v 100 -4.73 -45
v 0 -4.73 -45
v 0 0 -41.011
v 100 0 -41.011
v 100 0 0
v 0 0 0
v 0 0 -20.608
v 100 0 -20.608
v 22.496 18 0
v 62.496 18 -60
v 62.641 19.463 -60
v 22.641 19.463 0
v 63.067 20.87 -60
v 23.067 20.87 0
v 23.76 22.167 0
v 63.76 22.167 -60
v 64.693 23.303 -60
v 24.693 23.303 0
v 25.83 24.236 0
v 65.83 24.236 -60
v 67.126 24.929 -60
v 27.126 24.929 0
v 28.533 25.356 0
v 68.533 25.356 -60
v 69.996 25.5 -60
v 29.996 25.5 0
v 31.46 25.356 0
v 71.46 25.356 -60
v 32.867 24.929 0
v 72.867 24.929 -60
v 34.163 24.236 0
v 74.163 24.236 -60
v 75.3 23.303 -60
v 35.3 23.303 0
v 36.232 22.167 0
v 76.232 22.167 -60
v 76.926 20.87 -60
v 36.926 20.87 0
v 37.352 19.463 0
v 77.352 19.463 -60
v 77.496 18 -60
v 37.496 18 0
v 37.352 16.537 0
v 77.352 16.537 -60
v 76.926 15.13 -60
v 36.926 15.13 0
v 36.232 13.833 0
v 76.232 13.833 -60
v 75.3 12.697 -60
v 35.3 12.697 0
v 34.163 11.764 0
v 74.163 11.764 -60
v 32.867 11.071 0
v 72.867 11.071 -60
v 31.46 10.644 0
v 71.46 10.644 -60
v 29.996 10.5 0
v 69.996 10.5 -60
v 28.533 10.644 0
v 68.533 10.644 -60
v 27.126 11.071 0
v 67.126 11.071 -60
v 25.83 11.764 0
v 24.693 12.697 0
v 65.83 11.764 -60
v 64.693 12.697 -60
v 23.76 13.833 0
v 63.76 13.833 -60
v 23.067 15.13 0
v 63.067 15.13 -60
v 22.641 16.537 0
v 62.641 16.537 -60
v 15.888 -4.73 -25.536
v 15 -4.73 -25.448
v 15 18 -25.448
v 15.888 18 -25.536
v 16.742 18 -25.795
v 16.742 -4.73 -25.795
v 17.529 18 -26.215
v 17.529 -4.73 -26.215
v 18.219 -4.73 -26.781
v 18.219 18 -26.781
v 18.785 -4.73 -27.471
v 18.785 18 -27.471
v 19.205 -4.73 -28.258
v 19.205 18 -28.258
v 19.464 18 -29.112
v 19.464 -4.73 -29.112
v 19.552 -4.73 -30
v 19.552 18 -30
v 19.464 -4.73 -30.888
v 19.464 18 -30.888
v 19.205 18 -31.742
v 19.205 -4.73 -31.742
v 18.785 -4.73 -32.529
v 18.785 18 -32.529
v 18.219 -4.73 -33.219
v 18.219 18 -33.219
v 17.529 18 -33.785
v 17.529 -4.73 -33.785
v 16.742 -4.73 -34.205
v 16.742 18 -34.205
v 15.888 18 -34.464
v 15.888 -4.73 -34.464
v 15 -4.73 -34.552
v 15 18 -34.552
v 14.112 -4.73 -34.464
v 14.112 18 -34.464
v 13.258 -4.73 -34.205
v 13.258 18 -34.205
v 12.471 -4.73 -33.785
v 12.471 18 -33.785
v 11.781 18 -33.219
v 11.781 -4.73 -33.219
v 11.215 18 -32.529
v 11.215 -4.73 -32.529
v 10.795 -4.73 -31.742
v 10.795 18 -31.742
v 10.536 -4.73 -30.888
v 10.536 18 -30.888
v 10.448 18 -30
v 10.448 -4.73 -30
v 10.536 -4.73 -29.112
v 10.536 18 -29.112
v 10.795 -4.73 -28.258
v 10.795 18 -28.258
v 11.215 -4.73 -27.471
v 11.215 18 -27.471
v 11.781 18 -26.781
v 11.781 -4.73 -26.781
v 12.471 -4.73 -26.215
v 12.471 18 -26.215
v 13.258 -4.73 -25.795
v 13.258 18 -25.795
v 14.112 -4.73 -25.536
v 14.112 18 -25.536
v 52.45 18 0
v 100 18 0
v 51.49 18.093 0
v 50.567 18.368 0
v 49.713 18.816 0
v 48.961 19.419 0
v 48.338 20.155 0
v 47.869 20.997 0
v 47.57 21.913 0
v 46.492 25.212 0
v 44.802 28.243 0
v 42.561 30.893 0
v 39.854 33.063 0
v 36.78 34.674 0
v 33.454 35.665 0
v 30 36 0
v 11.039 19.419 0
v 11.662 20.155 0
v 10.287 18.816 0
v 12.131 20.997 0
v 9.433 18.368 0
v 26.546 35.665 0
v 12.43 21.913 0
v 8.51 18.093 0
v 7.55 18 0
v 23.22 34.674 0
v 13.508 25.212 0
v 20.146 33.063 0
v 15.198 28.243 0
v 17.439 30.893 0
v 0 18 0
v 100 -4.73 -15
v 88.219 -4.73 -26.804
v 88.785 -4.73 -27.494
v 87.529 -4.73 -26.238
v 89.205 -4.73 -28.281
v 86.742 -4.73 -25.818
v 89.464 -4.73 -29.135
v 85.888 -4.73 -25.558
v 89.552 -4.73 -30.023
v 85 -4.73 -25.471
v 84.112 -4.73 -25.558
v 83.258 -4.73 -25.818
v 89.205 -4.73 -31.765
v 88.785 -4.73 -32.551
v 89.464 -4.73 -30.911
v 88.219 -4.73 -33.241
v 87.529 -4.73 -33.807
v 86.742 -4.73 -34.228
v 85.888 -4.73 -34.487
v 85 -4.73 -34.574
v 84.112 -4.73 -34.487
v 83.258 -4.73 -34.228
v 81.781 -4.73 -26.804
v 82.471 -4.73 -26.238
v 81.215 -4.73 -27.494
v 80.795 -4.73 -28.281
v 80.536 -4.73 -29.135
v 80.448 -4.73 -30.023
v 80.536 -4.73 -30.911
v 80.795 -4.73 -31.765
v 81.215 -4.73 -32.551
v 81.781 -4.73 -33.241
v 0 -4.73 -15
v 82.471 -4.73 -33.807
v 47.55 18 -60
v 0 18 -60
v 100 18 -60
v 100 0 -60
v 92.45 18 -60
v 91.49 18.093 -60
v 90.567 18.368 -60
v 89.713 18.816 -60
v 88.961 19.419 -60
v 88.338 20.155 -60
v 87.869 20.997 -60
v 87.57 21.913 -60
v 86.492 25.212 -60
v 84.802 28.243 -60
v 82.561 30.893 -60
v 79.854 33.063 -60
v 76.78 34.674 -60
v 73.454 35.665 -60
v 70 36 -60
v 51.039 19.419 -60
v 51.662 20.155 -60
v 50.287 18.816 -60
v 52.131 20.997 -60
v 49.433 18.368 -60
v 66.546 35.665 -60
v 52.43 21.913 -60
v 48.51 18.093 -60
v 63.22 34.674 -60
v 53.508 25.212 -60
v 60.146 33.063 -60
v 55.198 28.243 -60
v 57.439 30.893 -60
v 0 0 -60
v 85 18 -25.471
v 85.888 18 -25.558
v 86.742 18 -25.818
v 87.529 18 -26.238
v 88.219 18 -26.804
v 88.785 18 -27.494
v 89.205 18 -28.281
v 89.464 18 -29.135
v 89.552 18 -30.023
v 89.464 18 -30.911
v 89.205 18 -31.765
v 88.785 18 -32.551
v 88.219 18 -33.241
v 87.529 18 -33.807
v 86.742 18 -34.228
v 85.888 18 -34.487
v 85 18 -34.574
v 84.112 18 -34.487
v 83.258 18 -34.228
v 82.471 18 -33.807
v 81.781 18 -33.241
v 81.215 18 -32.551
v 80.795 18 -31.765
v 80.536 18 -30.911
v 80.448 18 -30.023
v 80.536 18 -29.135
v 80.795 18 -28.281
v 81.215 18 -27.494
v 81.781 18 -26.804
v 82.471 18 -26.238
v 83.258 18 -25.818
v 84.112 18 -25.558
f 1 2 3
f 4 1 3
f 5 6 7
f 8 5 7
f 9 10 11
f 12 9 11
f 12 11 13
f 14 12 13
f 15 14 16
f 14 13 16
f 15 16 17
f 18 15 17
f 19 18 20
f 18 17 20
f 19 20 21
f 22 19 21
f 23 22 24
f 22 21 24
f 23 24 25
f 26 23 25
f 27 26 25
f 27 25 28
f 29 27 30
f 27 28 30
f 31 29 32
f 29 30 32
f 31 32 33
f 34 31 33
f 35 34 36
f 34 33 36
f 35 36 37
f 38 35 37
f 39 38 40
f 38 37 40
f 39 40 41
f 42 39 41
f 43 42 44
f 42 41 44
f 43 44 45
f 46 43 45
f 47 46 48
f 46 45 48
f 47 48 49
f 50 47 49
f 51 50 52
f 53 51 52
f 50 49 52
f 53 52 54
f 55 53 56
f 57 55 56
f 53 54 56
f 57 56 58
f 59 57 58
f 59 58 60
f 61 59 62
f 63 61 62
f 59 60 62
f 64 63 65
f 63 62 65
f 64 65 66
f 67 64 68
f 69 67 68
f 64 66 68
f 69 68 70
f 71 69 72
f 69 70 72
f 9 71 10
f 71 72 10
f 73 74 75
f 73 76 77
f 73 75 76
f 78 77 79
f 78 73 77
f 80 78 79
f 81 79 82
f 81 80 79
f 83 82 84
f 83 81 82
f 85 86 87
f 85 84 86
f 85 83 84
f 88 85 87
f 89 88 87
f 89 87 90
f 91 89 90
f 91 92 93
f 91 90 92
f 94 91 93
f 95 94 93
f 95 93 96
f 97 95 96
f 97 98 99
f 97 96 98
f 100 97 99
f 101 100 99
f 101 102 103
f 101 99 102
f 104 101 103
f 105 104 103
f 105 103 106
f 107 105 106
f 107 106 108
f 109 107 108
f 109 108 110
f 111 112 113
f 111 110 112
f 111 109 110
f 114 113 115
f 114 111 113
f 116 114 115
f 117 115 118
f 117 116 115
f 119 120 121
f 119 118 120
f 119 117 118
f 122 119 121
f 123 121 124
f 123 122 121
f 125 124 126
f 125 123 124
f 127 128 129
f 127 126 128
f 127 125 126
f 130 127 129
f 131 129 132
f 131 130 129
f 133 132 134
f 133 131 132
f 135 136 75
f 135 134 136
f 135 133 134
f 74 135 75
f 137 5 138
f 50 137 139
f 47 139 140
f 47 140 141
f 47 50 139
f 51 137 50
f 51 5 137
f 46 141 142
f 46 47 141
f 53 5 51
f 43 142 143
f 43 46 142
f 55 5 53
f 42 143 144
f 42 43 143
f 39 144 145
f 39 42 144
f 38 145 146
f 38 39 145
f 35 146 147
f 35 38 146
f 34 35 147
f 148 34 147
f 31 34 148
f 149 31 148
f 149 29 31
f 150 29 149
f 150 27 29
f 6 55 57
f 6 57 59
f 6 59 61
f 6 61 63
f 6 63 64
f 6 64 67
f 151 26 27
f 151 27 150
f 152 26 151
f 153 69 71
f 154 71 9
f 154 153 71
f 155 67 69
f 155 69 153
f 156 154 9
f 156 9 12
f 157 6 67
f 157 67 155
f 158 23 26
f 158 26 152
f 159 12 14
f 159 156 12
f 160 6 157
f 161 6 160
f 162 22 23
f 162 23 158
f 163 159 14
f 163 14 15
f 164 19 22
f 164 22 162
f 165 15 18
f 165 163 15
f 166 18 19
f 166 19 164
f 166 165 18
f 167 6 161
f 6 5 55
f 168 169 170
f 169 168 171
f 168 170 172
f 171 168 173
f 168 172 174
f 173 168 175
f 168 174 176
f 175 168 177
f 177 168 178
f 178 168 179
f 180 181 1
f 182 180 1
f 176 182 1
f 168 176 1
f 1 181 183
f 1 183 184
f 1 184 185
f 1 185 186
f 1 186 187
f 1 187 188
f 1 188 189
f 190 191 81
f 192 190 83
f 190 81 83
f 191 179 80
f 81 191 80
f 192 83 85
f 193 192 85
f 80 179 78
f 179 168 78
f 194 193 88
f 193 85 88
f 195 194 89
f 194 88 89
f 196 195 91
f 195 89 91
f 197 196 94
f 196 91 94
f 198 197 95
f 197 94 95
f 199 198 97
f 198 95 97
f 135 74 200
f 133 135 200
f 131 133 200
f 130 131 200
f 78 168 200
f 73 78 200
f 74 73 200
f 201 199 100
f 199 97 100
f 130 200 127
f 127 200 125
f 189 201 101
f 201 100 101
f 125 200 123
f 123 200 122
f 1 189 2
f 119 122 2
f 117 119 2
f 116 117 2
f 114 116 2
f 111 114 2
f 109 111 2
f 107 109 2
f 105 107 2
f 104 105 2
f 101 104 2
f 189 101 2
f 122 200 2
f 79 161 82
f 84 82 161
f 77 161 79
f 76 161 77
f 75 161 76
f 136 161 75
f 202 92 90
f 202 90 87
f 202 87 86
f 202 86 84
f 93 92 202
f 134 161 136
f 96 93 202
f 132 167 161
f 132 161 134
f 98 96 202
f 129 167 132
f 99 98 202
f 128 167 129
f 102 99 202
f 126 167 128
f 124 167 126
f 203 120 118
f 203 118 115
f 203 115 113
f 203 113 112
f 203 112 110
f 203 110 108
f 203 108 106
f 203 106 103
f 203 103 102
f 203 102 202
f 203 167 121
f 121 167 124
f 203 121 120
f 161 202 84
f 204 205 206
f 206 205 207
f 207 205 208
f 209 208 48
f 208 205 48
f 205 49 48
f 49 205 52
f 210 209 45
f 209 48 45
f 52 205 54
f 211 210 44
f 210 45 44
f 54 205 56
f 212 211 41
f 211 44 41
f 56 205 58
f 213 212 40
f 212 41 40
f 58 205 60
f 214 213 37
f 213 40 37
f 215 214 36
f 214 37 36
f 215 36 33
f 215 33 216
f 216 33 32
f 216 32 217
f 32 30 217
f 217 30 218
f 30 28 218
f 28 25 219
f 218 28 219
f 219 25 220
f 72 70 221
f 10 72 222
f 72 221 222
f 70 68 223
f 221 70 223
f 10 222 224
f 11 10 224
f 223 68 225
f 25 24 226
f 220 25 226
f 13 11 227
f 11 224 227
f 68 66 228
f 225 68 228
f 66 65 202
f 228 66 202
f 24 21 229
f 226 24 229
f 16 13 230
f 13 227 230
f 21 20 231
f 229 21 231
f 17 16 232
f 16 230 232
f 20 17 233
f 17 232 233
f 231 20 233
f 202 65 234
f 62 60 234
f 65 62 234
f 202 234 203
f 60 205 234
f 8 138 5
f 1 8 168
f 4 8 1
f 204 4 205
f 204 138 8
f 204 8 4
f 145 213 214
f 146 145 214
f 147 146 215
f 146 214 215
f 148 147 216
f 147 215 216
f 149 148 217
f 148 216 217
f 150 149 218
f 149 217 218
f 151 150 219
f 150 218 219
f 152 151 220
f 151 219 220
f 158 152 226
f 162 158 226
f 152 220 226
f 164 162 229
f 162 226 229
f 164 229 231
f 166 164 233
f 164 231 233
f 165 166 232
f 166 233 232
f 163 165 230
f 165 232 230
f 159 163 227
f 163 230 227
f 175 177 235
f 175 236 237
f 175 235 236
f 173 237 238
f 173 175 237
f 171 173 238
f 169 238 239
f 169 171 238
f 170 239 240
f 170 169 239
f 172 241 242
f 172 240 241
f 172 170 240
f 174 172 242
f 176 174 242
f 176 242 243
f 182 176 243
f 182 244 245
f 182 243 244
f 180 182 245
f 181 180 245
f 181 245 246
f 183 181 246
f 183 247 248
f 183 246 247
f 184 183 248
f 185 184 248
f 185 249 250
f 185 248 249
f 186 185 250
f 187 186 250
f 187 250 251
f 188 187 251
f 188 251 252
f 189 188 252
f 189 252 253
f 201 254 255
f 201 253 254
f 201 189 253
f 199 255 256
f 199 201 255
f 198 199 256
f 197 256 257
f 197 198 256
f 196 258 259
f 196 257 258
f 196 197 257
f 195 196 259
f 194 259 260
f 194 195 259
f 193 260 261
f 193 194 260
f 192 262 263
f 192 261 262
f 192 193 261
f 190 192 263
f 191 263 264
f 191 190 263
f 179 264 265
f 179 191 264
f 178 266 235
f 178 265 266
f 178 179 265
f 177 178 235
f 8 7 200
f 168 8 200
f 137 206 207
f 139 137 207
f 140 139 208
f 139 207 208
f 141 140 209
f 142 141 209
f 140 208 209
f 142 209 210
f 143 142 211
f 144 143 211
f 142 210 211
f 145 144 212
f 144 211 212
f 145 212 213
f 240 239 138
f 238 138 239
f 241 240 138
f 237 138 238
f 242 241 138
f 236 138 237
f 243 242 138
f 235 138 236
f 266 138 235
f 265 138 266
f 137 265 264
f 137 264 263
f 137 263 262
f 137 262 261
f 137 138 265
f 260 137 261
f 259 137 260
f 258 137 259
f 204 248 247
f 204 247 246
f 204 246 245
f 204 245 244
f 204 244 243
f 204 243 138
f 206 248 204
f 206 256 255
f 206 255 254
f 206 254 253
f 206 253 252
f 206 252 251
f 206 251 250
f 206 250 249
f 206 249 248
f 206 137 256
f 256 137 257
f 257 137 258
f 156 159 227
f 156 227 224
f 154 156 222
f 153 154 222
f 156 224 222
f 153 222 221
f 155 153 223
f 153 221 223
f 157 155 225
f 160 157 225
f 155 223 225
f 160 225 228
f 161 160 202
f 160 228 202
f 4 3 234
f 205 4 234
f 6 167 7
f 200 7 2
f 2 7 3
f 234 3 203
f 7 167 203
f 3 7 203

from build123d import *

# Parameters (mm, degrees)
SKETCH1_W               = 60
SKETCH1_H               = 18
BOSS_EXTRUDE1_DEPTH     = 100
SKETCH6_R               = 7.5
CUT_EXTRUDE1_DEPTH      = 123.049170419
CUT_EXTRUDE1_DEPTH_BACK = 123.049170419
SKETCH7_R               = 4.551669689


with BuildPart() as part:
    # Sketch1 → Boss-Extrude1 (new body)
    with BuildSketch(Plane(origin=(0, 0, 0), x_dir=(0, 0, -1), z_dir=(1, 0, 0))):
        with Locations((30, 9)):
            Rectangle(SKETCH1_W, SKETCH1_H)
        Polygon((41.010615422, 0), (20.608108108, 0), (15, -4.73), (45, -4.73), align=None)
    extrude(amount=BOSS_EXTRUDE1_DEPTH)

    # Sweep5: sweep along a path in Sketch3
    with BuildLine(Plane(origin=(0, 0, 0), x_dir=(1, 0, 0), z_dir=(0, 1, 0))) as sweep5_path:
        Line((30, 0), (70, 60))
    # Sketch2 → Sweep5 (sweep)
    with BuildSketch(Plane.XY):
        with BuildLine():
            Line((7.550055679, 18), (52.449944321, 18))
            ThreePointArc((52.449944321, 18), (49.32222811, 19.099052512), (47.569521642, 21.913043478))
            ThreePointArc((47.569521642, 21.913043478), (30, 36), (12.430478358, 21.913043478))
            ThreePointArc((12.430478358, 21.913043478), (10.67777189, 19.099052512), (7.550055679, 18))
        make_face()
    sweep(path=sweep5_path.line)

    # Cut-Sweep3: sweep along a path in Sketch3<4>
    with BuildLine(Plane(origin=(0, 0, 0), x_dir=(1, 0, 0), z_dir=(0, 1, 0))) as cut_sweep3_path:
        Line((30, 0), (70, 60))
    # Sketch6 → Cut-Sweep3 (sweep, cut)
    with BuildSketch(Plane(origin=(0, 0, -60), x_dir=(-1, 0, 0), z_dir=(0, 0, -1))):
        with Locations((-69.99646769, 18)):
            Circle(SKETCH6_R)
    sweep(path=cut_sweep3_path.line, mode=Mode.SUBTRACT)

    # Sketch7 → Cut-Extrude1 (cut, two sides: drawn at the far end of the back side and taken through both)
    with BuildSketch(Plane(origin=(0, 0, 0), x_dir=(1, 0, 0), z_dir=(0, 1, 0)).offset(-CUT_EXTRUDE1_DEPTH_BACK)):
        with Locations(Location((15, 30, 0), (0, 0, 270))):
            Circle(SKETCH7_R)
        with Locations(Location((84.999992632, 30.022710288, 0), (0, 0, 270))):
            Circle(SKETCH7_R)
    extrude(amount=CUT_EXTRUDE1_DEPTH + CUT_EXTRUDE1_DEPTH_BACK, mode=Mode.SUBTRACT)


solid = part.part
